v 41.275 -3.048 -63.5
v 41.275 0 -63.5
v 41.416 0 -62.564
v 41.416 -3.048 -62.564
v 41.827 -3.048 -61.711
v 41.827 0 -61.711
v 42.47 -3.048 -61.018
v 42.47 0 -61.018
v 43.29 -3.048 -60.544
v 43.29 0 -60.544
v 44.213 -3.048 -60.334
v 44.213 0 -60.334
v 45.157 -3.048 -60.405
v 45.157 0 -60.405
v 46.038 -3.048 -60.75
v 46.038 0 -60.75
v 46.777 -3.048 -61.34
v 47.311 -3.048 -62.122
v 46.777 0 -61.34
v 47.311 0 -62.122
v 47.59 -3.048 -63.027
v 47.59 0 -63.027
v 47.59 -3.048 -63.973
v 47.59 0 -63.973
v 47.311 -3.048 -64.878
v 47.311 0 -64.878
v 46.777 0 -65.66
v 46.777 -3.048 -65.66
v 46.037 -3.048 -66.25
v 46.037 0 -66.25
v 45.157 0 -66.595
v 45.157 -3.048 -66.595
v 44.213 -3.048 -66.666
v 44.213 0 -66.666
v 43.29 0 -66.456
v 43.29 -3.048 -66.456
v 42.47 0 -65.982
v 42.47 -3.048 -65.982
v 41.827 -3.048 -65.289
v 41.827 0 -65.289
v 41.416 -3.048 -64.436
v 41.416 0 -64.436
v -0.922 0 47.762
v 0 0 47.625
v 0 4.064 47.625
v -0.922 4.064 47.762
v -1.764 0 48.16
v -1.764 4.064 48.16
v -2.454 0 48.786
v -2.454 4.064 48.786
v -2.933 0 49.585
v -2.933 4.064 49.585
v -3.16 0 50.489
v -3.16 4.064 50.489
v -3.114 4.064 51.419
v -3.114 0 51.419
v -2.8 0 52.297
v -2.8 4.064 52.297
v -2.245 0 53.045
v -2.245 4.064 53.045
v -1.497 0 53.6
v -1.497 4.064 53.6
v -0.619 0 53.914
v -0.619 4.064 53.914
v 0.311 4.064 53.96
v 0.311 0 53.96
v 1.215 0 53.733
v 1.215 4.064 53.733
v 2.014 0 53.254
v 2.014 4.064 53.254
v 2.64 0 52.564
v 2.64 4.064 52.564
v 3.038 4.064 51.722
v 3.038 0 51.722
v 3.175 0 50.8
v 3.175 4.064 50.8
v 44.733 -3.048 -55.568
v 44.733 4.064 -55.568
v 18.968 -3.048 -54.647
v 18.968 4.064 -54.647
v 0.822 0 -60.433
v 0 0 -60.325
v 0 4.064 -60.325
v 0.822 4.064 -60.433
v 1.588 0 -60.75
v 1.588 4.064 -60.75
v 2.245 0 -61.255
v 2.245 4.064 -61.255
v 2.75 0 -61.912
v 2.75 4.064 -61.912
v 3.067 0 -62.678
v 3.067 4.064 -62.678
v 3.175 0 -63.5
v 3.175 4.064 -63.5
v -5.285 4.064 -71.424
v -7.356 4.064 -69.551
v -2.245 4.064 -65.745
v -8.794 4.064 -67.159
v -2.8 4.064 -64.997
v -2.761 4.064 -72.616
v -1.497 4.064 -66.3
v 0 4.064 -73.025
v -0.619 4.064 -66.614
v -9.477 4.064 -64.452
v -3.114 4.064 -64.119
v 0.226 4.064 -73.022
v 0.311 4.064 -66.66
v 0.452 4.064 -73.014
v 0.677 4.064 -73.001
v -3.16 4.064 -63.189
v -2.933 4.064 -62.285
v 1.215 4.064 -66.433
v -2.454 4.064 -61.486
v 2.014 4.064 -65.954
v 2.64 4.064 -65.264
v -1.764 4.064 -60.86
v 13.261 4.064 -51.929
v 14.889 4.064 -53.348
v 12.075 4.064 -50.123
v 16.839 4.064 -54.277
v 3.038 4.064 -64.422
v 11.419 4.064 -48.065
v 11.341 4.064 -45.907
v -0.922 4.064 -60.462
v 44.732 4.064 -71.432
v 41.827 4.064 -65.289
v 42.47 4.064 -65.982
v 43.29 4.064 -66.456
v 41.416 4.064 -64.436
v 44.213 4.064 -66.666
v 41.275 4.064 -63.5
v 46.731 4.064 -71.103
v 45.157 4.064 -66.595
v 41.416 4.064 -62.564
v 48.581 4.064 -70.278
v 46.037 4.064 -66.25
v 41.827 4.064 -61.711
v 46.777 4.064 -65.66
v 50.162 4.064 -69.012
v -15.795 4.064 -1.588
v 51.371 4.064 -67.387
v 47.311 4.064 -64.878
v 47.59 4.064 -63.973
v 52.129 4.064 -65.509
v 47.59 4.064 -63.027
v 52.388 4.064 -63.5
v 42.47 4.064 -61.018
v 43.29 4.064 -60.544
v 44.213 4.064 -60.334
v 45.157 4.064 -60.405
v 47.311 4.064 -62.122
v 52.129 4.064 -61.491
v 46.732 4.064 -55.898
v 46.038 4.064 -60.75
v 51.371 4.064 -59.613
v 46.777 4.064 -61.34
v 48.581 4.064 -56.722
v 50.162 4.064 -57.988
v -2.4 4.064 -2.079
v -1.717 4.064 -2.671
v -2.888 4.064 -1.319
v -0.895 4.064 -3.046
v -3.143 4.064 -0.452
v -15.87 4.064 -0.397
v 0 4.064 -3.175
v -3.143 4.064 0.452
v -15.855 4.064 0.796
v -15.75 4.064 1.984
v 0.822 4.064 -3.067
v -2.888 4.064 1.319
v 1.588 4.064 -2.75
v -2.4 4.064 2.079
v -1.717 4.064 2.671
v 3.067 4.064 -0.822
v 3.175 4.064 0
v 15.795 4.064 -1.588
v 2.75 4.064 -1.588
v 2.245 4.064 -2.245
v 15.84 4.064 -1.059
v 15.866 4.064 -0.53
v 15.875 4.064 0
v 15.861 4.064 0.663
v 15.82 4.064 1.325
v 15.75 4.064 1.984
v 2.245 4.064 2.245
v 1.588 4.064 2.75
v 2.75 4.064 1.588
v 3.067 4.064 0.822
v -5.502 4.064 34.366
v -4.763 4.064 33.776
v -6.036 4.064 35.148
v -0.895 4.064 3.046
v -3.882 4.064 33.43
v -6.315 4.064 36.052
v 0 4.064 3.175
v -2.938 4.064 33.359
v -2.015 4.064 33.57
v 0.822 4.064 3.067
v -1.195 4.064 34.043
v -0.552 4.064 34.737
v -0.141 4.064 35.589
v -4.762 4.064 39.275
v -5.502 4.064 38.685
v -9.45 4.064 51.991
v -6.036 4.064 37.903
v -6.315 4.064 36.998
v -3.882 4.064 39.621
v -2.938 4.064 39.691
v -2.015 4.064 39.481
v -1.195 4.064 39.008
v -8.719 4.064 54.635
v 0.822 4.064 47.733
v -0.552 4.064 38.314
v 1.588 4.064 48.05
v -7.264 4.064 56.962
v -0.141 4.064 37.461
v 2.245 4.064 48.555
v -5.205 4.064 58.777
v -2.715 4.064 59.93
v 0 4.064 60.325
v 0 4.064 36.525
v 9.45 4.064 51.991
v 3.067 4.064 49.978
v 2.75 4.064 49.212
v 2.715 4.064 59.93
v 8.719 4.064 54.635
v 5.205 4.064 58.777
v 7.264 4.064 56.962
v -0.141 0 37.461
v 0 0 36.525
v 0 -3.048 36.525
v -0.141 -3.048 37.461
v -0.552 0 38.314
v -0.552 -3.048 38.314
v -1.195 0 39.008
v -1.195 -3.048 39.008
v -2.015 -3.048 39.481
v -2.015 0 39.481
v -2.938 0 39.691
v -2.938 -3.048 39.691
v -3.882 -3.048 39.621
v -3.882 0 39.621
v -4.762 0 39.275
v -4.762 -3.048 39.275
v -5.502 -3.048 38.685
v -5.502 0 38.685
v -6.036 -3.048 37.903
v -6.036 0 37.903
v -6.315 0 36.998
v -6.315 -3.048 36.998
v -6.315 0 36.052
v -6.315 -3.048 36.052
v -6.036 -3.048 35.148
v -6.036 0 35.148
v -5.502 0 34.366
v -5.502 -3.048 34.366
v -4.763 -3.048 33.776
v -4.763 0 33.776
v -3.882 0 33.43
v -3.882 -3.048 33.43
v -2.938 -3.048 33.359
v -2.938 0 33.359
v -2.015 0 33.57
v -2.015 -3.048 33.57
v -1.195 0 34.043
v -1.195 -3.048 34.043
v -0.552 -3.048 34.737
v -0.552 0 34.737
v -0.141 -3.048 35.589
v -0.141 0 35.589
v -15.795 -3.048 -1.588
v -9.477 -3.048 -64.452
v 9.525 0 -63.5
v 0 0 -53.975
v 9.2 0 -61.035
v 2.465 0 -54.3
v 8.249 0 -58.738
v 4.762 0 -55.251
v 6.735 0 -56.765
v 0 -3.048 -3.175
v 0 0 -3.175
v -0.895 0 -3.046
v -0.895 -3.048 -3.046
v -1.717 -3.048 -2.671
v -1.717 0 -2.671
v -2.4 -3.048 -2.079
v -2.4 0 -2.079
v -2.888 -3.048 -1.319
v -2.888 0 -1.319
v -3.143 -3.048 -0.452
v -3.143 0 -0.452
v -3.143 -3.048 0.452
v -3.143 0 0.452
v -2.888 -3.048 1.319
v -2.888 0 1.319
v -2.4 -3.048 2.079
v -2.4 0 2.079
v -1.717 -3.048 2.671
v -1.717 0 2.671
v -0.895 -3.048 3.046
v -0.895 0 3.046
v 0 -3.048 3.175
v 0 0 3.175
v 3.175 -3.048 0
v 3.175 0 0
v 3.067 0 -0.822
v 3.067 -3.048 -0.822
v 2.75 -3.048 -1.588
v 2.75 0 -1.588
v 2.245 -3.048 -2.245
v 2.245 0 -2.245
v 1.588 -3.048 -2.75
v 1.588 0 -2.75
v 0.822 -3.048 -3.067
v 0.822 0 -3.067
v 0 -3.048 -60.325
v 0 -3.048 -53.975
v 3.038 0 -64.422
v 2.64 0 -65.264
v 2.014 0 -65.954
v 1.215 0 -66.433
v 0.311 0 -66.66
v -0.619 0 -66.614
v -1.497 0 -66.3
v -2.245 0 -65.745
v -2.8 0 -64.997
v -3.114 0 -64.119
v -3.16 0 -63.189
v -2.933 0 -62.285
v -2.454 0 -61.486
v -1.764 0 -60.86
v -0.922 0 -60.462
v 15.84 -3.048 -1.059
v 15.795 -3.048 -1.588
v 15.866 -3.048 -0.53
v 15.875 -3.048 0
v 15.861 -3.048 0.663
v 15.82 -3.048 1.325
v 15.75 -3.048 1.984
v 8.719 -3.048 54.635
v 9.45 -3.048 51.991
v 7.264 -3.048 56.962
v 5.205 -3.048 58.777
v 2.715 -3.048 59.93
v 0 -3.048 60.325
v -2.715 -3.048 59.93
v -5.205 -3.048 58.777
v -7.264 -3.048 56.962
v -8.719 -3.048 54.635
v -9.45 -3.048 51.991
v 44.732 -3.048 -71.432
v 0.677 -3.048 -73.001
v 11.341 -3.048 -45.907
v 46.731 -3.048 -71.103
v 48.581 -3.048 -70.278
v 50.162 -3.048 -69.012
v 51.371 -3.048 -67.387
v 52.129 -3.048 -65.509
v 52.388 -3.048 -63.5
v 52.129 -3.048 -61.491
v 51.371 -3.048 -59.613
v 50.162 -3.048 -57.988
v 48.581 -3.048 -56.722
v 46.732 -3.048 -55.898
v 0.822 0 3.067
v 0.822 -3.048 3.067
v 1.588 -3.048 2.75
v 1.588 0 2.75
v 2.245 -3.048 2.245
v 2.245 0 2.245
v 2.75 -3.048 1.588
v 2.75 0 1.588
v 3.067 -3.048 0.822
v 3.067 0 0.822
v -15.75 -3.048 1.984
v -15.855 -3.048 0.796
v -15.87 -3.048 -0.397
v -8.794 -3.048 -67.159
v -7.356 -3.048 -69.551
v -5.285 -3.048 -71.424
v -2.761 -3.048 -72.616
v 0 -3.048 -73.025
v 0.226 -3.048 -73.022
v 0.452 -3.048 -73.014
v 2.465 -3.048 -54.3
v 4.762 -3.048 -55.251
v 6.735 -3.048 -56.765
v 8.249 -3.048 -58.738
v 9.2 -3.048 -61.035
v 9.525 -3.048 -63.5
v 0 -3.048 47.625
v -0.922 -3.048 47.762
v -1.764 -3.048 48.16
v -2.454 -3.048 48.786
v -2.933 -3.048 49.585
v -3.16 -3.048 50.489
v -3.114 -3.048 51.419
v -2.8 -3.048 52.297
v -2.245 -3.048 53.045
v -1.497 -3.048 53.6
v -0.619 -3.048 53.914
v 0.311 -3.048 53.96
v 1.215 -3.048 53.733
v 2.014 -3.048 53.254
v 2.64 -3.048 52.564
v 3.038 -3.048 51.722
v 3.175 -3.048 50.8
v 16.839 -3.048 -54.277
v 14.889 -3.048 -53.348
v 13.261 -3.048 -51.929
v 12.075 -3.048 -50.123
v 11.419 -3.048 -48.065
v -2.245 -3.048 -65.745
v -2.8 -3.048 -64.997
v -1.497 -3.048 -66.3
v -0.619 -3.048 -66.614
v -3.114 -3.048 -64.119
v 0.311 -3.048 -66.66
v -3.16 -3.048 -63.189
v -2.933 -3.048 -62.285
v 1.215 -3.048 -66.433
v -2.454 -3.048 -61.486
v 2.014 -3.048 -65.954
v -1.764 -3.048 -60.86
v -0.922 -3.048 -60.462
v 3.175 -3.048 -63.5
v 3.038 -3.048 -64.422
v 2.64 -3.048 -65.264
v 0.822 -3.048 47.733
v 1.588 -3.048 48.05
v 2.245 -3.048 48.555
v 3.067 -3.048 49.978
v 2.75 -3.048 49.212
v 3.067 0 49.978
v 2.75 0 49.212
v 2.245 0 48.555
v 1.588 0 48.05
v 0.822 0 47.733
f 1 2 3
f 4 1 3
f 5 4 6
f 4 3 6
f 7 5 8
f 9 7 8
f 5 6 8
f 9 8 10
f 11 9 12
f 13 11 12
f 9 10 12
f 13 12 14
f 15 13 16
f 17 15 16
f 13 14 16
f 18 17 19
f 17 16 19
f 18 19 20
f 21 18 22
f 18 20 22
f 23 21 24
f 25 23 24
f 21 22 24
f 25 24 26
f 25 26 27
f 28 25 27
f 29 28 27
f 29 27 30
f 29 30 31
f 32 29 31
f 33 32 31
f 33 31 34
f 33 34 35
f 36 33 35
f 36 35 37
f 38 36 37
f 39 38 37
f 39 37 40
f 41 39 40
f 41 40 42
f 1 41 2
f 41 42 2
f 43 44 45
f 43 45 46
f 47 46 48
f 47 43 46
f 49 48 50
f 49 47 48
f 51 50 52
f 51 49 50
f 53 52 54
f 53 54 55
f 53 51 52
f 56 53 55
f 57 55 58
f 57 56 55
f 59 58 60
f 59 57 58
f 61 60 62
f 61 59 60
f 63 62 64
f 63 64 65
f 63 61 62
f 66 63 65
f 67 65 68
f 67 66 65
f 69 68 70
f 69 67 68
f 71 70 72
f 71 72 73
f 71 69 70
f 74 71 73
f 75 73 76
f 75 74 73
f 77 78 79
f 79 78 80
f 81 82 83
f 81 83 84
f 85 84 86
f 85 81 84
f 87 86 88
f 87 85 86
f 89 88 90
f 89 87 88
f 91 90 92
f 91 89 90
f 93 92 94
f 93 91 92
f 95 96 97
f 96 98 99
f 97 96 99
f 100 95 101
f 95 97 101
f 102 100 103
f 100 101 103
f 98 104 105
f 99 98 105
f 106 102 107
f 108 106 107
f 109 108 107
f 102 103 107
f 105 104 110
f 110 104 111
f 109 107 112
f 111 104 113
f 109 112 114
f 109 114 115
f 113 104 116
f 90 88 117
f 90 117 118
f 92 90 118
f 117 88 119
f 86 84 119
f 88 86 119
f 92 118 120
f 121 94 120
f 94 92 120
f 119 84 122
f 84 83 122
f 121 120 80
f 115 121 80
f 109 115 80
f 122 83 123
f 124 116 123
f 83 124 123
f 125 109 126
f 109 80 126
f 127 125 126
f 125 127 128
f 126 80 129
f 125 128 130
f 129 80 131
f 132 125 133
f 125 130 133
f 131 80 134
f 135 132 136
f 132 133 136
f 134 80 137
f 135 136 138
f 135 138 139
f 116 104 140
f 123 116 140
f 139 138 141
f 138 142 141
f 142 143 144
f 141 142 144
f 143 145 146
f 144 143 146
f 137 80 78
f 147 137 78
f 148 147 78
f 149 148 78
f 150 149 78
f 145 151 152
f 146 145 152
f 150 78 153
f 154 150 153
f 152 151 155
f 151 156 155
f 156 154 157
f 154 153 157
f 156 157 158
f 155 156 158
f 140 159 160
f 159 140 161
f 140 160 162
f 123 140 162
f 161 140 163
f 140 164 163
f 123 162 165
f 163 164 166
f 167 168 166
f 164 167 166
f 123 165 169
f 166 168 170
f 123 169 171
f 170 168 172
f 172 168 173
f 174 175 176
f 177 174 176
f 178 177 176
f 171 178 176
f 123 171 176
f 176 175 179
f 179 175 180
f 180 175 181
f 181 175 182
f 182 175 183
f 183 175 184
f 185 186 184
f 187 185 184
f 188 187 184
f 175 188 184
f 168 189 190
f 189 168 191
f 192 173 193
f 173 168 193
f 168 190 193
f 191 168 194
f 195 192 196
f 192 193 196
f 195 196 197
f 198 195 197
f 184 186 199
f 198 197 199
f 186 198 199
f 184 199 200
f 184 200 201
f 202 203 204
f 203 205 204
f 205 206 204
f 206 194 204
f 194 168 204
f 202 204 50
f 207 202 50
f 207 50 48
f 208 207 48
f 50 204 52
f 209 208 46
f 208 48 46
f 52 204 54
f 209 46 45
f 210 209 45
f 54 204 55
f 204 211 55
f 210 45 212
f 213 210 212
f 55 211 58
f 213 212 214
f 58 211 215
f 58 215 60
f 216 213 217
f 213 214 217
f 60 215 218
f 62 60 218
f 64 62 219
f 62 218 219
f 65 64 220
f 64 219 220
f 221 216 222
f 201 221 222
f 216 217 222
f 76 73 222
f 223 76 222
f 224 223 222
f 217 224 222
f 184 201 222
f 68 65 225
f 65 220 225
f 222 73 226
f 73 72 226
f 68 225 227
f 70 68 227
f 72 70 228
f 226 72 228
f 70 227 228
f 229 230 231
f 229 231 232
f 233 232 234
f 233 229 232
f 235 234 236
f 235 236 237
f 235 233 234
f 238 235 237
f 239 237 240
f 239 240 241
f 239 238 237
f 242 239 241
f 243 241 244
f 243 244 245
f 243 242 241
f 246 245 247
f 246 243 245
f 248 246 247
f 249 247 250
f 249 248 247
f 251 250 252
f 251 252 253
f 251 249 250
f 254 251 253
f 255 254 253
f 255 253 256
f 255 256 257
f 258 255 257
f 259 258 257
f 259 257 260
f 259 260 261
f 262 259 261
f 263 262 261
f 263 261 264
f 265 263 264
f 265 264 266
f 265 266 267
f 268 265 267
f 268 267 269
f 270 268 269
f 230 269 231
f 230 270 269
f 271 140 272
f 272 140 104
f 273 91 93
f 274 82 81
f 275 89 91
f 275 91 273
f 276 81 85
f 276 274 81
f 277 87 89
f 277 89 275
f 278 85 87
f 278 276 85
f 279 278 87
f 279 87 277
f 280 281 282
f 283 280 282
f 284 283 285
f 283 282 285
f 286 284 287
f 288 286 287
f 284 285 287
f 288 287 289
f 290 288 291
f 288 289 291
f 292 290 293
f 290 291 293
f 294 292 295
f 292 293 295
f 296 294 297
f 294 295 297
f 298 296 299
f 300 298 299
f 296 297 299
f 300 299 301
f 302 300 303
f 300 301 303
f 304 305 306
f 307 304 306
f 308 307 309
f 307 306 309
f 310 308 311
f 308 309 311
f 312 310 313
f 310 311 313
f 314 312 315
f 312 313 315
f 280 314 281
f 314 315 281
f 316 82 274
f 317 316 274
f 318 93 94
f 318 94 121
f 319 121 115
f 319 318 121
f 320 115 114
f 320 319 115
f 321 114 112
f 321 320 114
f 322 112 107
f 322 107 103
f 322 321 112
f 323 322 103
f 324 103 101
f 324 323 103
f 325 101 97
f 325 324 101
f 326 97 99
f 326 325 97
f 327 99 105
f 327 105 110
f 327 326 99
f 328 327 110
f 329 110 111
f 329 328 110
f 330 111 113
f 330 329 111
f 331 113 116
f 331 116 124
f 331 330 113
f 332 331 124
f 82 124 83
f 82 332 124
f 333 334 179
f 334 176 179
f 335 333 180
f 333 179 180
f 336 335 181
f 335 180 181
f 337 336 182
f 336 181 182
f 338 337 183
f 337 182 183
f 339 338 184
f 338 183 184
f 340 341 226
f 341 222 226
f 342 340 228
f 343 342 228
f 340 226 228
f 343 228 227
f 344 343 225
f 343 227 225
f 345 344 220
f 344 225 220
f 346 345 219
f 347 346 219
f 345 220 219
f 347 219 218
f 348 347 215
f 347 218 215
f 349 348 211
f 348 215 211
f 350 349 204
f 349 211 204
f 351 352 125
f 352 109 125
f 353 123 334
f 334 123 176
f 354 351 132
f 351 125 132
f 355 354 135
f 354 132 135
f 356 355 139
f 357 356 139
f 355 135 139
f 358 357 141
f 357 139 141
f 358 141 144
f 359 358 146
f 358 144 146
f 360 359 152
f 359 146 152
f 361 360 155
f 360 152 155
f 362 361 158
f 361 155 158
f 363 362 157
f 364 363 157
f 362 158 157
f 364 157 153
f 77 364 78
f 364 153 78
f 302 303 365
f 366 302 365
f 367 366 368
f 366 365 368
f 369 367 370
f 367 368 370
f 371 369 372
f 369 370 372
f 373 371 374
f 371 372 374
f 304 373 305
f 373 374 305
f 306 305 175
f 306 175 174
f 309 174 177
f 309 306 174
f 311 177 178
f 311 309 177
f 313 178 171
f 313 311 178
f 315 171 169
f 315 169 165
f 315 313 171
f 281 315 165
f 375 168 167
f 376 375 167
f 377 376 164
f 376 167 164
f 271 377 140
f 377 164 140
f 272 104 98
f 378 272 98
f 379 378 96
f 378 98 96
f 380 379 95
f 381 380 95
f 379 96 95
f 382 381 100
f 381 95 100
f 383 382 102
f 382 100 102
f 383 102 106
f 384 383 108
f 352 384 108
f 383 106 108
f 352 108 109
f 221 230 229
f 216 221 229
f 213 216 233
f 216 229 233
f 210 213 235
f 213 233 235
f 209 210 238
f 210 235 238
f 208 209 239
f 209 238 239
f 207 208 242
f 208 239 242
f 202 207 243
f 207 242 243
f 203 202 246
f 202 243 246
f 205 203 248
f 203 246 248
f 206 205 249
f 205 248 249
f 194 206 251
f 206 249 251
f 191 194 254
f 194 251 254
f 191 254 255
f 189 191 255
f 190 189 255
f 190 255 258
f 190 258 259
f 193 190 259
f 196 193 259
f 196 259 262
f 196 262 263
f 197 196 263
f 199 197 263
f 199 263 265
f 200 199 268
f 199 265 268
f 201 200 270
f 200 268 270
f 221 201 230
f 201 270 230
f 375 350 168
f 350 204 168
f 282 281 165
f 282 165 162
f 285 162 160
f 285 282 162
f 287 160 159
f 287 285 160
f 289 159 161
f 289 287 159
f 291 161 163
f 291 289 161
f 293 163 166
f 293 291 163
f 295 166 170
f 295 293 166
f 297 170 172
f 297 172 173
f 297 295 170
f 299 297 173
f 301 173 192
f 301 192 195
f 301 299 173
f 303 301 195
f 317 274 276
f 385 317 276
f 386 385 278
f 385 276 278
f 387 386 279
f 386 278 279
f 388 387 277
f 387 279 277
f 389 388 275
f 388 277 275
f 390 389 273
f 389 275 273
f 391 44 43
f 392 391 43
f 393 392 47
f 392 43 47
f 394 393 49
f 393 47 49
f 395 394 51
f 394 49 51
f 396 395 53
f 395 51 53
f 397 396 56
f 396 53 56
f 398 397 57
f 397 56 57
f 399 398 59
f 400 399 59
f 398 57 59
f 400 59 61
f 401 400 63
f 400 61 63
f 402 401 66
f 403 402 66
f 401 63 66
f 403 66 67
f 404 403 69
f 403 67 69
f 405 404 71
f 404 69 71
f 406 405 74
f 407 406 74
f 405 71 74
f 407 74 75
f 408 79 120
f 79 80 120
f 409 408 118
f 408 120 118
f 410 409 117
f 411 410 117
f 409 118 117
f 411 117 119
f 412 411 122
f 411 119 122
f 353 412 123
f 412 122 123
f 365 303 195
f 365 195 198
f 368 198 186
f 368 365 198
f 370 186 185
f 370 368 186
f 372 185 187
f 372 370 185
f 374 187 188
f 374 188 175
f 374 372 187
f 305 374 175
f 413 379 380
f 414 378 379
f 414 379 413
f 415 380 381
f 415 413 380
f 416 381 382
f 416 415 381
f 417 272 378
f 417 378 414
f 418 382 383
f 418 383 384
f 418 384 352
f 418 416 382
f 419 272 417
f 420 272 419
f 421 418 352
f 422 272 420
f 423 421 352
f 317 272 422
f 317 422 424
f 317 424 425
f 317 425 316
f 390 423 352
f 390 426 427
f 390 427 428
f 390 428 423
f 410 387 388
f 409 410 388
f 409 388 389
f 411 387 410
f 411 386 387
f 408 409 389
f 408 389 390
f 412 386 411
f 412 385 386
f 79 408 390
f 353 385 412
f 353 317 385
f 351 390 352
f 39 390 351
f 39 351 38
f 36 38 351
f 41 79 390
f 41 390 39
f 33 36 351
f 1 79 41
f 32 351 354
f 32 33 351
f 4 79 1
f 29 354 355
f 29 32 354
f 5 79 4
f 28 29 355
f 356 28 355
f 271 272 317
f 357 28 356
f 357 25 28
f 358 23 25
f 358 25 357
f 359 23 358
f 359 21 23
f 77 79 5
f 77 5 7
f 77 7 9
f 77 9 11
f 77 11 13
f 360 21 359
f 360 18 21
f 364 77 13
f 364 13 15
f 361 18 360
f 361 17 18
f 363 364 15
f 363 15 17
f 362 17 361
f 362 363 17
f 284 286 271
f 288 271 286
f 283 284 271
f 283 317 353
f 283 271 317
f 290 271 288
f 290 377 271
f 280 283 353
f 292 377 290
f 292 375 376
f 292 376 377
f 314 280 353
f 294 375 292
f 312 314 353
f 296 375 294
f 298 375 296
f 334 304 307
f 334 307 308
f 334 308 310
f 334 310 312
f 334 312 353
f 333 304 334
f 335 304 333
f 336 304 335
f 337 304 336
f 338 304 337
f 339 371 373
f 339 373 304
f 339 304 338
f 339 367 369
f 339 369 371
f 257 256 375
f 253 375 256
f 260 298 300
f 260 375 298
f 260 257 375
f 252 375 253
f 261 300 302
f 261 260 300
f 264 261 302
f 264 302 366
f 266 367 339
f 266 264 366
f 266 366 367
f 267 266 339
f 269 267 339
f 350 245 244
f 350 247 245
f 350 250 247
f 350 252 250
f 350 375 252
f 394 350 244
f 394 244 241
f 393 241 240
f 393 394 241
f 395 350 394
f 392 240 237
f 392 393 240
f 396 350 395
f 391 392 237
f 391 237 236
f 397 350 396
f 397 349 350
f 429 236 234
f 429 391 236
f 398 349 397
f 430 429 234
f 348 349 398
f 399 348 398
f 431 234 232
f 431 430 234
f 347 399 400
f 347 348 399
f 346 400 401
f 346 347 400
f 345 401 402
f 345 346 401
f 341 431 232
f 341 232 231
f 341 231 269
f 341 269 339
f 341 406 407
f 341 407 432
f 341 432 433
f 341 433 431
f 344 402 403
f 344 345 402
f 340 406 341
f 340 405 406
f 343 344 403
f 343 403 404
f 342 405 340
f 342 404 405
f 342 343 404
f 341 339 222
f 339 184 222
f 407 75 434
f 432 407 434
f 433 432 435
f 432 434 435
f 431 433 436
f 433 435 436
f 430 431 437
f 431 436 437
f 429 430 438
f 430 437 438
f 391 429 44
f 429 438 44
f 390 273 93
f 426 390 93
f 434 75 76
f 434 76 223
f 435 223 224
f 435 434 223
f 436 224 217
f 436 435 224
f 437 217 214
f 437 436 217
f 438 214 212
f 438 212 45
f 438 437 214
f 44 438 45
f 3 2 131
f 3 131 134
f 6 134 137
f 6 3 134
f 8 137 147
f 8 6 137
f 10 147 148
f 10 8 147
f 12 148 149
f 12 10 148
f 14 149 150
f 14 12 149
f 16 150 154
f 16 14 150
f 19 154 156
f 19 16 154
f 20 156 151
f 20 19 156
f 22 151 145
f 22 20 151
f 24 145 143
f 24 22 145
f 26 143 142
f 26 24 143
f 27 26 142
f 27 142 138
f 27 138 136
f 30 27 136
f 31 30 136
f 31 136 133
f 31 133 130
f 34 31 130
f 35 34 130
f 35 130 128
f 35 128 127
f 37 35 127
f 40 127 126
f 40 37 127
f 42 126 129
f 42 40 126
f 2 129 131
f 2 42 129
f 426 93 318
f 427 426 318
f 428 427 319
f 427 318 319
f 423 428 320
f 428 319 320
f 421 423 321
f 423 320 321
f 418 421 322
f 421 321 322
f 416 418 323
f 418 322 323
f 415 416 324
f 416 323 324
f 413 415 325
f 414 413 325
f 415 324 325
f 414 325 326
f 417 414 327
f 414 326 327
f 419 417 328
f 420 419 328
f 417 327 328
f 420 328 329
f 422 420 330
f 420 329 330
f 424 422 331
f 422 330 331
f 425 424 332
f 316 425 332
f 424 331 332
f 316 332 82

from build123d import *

# Parameters (mm, degrees)
F0_R     = 3.175
F1_DEPTH = 4.064
F2_DEPTH = 3.048


with BuildPart() as f1:
    # F0 (on Front) → F1 (new body)
    with BuildSketch(Plane.XZ):
        with BuildLine():
            ThreePointArc((15.7954255641, -1.5875), (15.8550939106, -0.7947465541), (15.875, 0))
            ThreePointArc((15.875, 0), (15.8438414904, 0.9941387366), (15.7504882737, 1.984375))
            ThreePointArc((15.7504882737, 1.984375), (10.5003255158, 11.90625), (0, 15.875))
            Line((0, 15.875), (0, 3.175))
            ThreePointArc((0, 3.175), (2.2450640303, 2.2450640303), (3.175, 0))
            ThreePointArc((3.175, 0), (2.2450640303, -2.2450640303), (0, -3.175))
            Line((0, -3.175), (0, -15.875))
            ThreePointArc((0, -15.875), (10.6492737428, -11.7732150983), (15.7954255641, -1.5875))
        make_face()
        with BuildLine():
            ThreePointArc((0, 15.875), (10.5003255158, 11.90625), (15.7504882737, 1.984375))
            Line((15.7504882737, 1.984375), (9.4502929642, 51.990625))
            ThreePointArc((9.4502929642, 51.990625), (9.5063048942, 51.396483242), (9.525, 50.8))
            ThreePointArc((9.525, 50.8), (6.7351920908, 44.0648079092), (0, 41.275))
            Line((0, 41.275), (0, 36.5252))
            Line((0, 36.5252), (0, 29.7381002456))
            Line((0, 29.7381002456), (0, 15.875))
        make_face()
        with BuildLine():
            Line((11.3411865923, -45.9066181876), (15.7954255641, -1.5875))
            ThreePointArc((15.7954255641, -1.5875), (10.6492737428, -11.7732150983), (0, -15.875))
            Line((0, -15.875), (0, -53.975))
            ThreePointArc((0, -53.975), (6.7351920908, -56.7648079092), (9.525, -63.5))
            Line((9.525, -63.5), (36.5125, -63.5))
            ThreePointArc((36.5125, -63.5), (38.9384772185, -57.7879930953), (44.7334821429, -55.5675637964))
            Line((44.7334821429, -55.5675637964), (18.9676000005, -54.6467662892))
            ThreePointArc((18.9676000005, -54.6467662892), (13.2611998974, -51.9286408502), (11.3411865923, -45.9066181876))
        make_face()
        with BuildLine():
            Line((0, 3.175), (0, 15.875))
            ThreePointArc((0, 15.875), (-10.5003255158, 11.90625), (-15.7504882737, 1.984375))
            ThreePointArc((-15.7504882737, 1.984375), (-15.8737438155, 0.1997054867), (-15.7954255641, -1.5875))
            ThreePointArc((-15.7954255641, -1.5875), (-10.6492737428, -11.7732150983), (0, -15.875))
            Line((0, -15.875), (0, -3.175))
            ThreePointArc((0, -3.175), (-3.175, 0), (0, 3.175))
        make_face()
        with BuildLine():
            ThreePointArc((-15.7504882737, 1.984375), (-10.5003255158, 11.90625), (0, 15.875))
            Line((0, 15.875), (0, 29.7381002456))
            Line((0, 29.7381002456), (0, 36.5252))
            Line((0, 36.5252), (0, 41.275))
            ThreePointArc((0, 41.275), (-7.14375, 44.4998046905), (-9.4502929642, 51.990625))
            Line((-9.4502929642, 51.990625), (-15.7504882737, 1.984375))
        make_face()
        with Locations((-3.175, 36.5252)):
            Circle(F0_R, mode=Mode.SUBTRACT)
        with BuildLine():
            ThreePointArc((9.525, 50.8), (9.5063048942, 51.396483242), (9.4502929642, 51.990625))
            ThreePointArc((9.4502929642, 51.990625), (0, 60.325), (-9.4502929642, 51.990625))
            ThreePointArc((-9.4502929642, 51.990625), (-7.14375, 44.4998046905), (0, 41.275))
            ThreePointArc((0, 41.275), (6.7351920908, 44.0648079092), (9.525, 50.8))
        make_face()
        with BuildLine():
            ThreePointArc((3.175, 50.8), (2.2450640303, 48.5549359697), (0, 47.625))
            ThreePointArc((0, 47.625), (-2.2450640303, 53.0450640303), (3.175, 50.8))
        make_face(mode=Mode.SUBTRACT)
        with BuildLine():
            Line((0, -53.975), (0, -15.875))
            ThreePointArc((0, -15.875), (-10.6492737428, -11.7732150983), (-15.7954255641, -1.5875))
            Line((-15.7954255641, -1.5875), (-9.4772553384, -64.4525))
            ThreePointArc((-9.4772553384, -64.4525), (-7.063929059, -57.1104357543), (0, -53.975))
        make_face()
        with BuildLine():
            Line((0, -60.325), (0, -53.975))
            ThreePointArc((0, -53.975), (-7.063929059, -57.1104357543), (-9.4772553384, -64.4525))
            ThreePointArc((-9.4772553384, -64.4525), (-6.3895642457, -70.563929059), (0, -73.025))
            Line((0, -73.025), (0.6773435479, -73.000885786))
            ThreePointArc((0.6773435479, -73.000885786), (6.9705567315, -69.9912990883), (9.525, -63.5))
            Line((9.525, -63.5), (3.175, -63.5))
            ThreePointArc((3.175, -63.5), (-2.2450640303, -65.7450640303), (0, -60.325))
        make_face()
        with BuildLine():
            Line((36.5125, -63.5), (9.525, -63.5))
            ThreePointArc((9.525, -63.5), (6.9705567315, -69.9912990883), (0.6773435479, -73.000885786))
            Line((0.6773435479, -73.000885786), (44.7324052746, -71.4324746146))
            ThreePointArc((44.7324052746, -71.4324746146), (38.9380895153, -69.2116327839), (36.5125, -63.5))
        make_face()
        with BuildLine():
            ThreePointArc((52.3875, -63.5), (50.1620069047, -57.9884772185), (44.7334821429, -55.5675637964))
            ThreePointArc((44.7334821429, -55.5675637964), (38.9384772185, -57.7879930953), (36.5125, -63.5))
            ThreePointArc((36.5125, -63.5), (38.9380895153, -69.2116327839), (44.7324052746, -71.4324746146))
            ThreePointArc((44.7324052746, -71.4324746146), (50.1616327839, -69.0119104847), (52.3875, -63.5))
        make_face()
        with BuildLine():
            ThreePointArc((47.625, -63.5), (44.45, -66.675), (41.275, -63.5))
            ThreePointArc((41.275, -63.5), (44.45, -60.325), (47.625, -63.5))
        make_face(mode=Mode.SUBTRACT)
        with BuildLine():
            Line((0.6773435479, -73.000885786), (0, -73.025))
            ThreePointArc((0, -73.025), (0.3388863295, -73.0189695375), (0.6773435479, -73.000885786))
        make_face()
        with BuildLine():
            ThreePointArc((9.525, -63.5), (6.7351920908, -56.7648079092), (0, -53.975))
            Line((0, -53.975), (0, -60.325))
            ThreePointArc((0, -60.325), (2.2450640303, -61.2549359697), (3.175, -63.5))
            Line((3.175, -63.5), (9.525, -63.5))
        make_face()
    extrude(amount=-F1_DEPTH)

    # F0 (on Front) → F2 (join)
    with BuildSketch(Plane.XZ):
        with BuildLine():
            ThreePointArc((15.7954255641, -1.5875), (15.8550939106, -0.7947465541), (15.875, 0))
            ThreePointArc((15.875, 0), (15.8438414904, 0.9941387366), (15.7504882737, 1.984375))
            ThreePointArc((15.7504882737, 1.984375), (10.5003255158, 11.90625), (0, 15.875))
            Line((0, 15.875), (0, 3.175))
            ThreePointArc((0, 3.175), (2.2450640303, 2.2450640303), (3.175, 0))
            ThreePointArc((3.175, 0), (2.2450640303, -2.2450640303), (0, -3.175))
            Line((0, -3.175), (0, -15.875))
            ThreePointArc((0, -15.875), (10.6492737428, -11.7732150983), (15.7954255641, -1.5875))
        make_face()
        with BuildLine():
            ThreePointArc((0, 15.875), (10.5003255158, 11.90625), (15.7504882737, 1.984375))
            Line((15.7504882737, 1.984375), (9.4502929642, 51.990625))
            ThreePointArc((9.4502929642, 51.990625), (9.5063048942, 51.396483242), (9.525, 50.8))
            ThreePointArc((9.525, 50.8), (6.7351920908, 44.0648079092), (0, 41.275))
            Line((0, 41.275), (0, 36.5252))
            Line((0, 36.5252), (0, 29.7381002456))
            Line((0, 29.7381002456), (0, 15.875))
        make_face()
        with BuildLine():
            Line((11.3411865923, -45.9066181876), (15.7954255641, -1.5875))
            ThreePointArc((15.7954255641, -1.5875), (10.6492737428, -11.7732150983), (0, -15.875))
            Line((0, -15.875), (0, -53.975))
            ThreePointArc((0, -53.975), (6.7351920908, -56.7648079092), (9.525, -63.5))
            Line((9.525, -63.5), (36.5125, -63.5))
            ThreePointArc((36.5125, -63.5), (38.9384772185, -57.7879930953), (44.7334821429, -55.5675637964))
            Line((44.7334821429, -55.5675637964), (18.9676000005, -54.6467662892))
            ThreePointArc((18.9676000005, -54.6467662892), (13.2611998974, -51.9286408502), (11.3411865923, -45.9066181876))
        make_face()
        with BuildLine():
            Line((0, 3.175), (0, 15.875))
            ThreePointArc((0, 15.875), (-10.5003255158, 11.90625), (-15.7504882737, 1.984375))
            ThreePointArc((-15.7504882737, 1.984375), (-15.8737438155, 0.1997054867), (-15.7954255641, -1.5875))
            ThreePointArc((-15.7954255641, -1.5875), (-10.6492737428, -11.7732150983), (0, -15.875))
            Line((0, -15.875), (0, -3.175))
            ThreePointArc((0, -3.175), (-3.175, 0), (0, 3.175))
        make_face()
        with BuildLine():
            ThreePointArc((-15.7504882737, 1.984375), (-10.5003255158, 11.90625), (0, 15.875))
            Line((0, 15.875), (0, 29.7381002456))
            Line((0, 29.7381002456), (0, 36.5252))
            Line((0, 36.5252), (0, 41.275))
            ThreePointArc((0, 41.275), (-7.14375, 44.4998046905), (-9.4502929642, 51.990625))
            Line((-9.4502929642, 51.990625), (-15.7504882737, 1.984375))
        make_face()
        with Locations((-3.175, 36.5252)):
            Circle(F0_R, mode=Mode.SUBTRACT)
        with BuildLine():
            ThreePointArc((9.525, 50.8), (9.5063048942, 51.396483242), (9.4502929642, 51.990625))
            ThreePointArc((9.4502929642, 51.990625), (0, 60.325), (-9.4502929642, 51.990625))
            ThreePointArc((-9.4502929642, 51.990625), (-7.14375, 44.4998046905), (0, 41.275))
            ThreePointArc((0, 41.275), (6.7351920908, 44.0648079092), (9.525, 50.8))
        make_face()
        with BuildLine():
            ThreePointArc((3.175, 50.8), (2.2450640303, 48.5549359697), (0, 47.625))
            ThreePointArc((0, 47.625), (-2.2450640303, 53.0450640303), (3.175, 50.8))
        make_face(mode=Mode.SUBTRACT)
        with BuildLine():
            Line((0, -53.975), (0, -15.875))
            ThreePointArc((0, -15.875), (-10.6492737428, -11.7732150983), (-15.7954255641, -1.5875))
            Line((-15.7954255641, -1.5875), (-9.4772553384, -64.4525))
            ThreePointArc((-9.4772553384, -64.4525), (-7.063929059, -57.1104357543), (0, -53.975))
        make_face()
        with BuildLine():
            Line((0, -60.325), (0, -53.975))
            ThreePointArc((0, -53.975), (-7.063929059, -57.1104357543), (-9.4772553384, -64.4525))
            ThreePointArc((-9.4772553384, -64.4525), (-6.3895642457, -70.563929059), (0, -73.025))
            Line((0, -73.025), (0.6773435479, -73.000885786))
            ThreePointArc((0.6773435479, -73.000885786), (6.9705567315, -69.9912990883), (9.525, -63.5))
            Line((9.525, -63.5), (3.175, -63.5))
            ThreePointArc((3.175, -63.5), (-2.2450640303, -65.7450640303), (0, -60.325))
        make_face()
        with BuildLine():
            Line((36.5125, -63.5), (9.525, -63.5))
            ThreePointArc((9.525, -63.5), (6.9705567315, -69.9912990883), (0.6773435479, -73.000885786))
            Line((0.6773435479, -73.000885786), (44.7324052746, -71.4324746146))
            ThreePointArc((44.7324052746, -71.4324746146), (38.9380895153, -69.2116327839), (36.5125, -63.5))
        make_face()
        with BuildLine():
            ThreePointArc((52.3875, -63.5), (50.1620069047, -57.9884772185), (44.7334821429, -55.5675637964))
            ThreePointArc((44.7334821429, -55.5675637964), (38.9384772185, -57.7879930953), (36.5125, -63.5))
            ThreePointArc((36.5125, -63.5), (38.9380895153, -69.2116327839), (44.7324052746, -71.4324746146))
            ThreePointArc((44.7324052746, -71.4324746146), (50.1616327839, -69.0119104847), (52.3875, -63.5))
        make_face()
        with BuildLine():
            ThreePointArc((47.625, -63.5), (44.45, -66.675), (41.275, -63.5))
            ThreePointArc((41.275, -63.5), (44.45, -60.325), (47.625, -63.5))
        make_face(mode=Mode.SUBTRACT)
        with BuildLine():
            Line((0.6773435479, -73.000885786), (0, -73.025))
            ThreePointArc((0, -73.025), (0.3388863295, -73.0189695375), (0.6773435479, -73.000885786))
        make_face()
    extrude(amount=F2_DEPTH)


solid = f1.part
